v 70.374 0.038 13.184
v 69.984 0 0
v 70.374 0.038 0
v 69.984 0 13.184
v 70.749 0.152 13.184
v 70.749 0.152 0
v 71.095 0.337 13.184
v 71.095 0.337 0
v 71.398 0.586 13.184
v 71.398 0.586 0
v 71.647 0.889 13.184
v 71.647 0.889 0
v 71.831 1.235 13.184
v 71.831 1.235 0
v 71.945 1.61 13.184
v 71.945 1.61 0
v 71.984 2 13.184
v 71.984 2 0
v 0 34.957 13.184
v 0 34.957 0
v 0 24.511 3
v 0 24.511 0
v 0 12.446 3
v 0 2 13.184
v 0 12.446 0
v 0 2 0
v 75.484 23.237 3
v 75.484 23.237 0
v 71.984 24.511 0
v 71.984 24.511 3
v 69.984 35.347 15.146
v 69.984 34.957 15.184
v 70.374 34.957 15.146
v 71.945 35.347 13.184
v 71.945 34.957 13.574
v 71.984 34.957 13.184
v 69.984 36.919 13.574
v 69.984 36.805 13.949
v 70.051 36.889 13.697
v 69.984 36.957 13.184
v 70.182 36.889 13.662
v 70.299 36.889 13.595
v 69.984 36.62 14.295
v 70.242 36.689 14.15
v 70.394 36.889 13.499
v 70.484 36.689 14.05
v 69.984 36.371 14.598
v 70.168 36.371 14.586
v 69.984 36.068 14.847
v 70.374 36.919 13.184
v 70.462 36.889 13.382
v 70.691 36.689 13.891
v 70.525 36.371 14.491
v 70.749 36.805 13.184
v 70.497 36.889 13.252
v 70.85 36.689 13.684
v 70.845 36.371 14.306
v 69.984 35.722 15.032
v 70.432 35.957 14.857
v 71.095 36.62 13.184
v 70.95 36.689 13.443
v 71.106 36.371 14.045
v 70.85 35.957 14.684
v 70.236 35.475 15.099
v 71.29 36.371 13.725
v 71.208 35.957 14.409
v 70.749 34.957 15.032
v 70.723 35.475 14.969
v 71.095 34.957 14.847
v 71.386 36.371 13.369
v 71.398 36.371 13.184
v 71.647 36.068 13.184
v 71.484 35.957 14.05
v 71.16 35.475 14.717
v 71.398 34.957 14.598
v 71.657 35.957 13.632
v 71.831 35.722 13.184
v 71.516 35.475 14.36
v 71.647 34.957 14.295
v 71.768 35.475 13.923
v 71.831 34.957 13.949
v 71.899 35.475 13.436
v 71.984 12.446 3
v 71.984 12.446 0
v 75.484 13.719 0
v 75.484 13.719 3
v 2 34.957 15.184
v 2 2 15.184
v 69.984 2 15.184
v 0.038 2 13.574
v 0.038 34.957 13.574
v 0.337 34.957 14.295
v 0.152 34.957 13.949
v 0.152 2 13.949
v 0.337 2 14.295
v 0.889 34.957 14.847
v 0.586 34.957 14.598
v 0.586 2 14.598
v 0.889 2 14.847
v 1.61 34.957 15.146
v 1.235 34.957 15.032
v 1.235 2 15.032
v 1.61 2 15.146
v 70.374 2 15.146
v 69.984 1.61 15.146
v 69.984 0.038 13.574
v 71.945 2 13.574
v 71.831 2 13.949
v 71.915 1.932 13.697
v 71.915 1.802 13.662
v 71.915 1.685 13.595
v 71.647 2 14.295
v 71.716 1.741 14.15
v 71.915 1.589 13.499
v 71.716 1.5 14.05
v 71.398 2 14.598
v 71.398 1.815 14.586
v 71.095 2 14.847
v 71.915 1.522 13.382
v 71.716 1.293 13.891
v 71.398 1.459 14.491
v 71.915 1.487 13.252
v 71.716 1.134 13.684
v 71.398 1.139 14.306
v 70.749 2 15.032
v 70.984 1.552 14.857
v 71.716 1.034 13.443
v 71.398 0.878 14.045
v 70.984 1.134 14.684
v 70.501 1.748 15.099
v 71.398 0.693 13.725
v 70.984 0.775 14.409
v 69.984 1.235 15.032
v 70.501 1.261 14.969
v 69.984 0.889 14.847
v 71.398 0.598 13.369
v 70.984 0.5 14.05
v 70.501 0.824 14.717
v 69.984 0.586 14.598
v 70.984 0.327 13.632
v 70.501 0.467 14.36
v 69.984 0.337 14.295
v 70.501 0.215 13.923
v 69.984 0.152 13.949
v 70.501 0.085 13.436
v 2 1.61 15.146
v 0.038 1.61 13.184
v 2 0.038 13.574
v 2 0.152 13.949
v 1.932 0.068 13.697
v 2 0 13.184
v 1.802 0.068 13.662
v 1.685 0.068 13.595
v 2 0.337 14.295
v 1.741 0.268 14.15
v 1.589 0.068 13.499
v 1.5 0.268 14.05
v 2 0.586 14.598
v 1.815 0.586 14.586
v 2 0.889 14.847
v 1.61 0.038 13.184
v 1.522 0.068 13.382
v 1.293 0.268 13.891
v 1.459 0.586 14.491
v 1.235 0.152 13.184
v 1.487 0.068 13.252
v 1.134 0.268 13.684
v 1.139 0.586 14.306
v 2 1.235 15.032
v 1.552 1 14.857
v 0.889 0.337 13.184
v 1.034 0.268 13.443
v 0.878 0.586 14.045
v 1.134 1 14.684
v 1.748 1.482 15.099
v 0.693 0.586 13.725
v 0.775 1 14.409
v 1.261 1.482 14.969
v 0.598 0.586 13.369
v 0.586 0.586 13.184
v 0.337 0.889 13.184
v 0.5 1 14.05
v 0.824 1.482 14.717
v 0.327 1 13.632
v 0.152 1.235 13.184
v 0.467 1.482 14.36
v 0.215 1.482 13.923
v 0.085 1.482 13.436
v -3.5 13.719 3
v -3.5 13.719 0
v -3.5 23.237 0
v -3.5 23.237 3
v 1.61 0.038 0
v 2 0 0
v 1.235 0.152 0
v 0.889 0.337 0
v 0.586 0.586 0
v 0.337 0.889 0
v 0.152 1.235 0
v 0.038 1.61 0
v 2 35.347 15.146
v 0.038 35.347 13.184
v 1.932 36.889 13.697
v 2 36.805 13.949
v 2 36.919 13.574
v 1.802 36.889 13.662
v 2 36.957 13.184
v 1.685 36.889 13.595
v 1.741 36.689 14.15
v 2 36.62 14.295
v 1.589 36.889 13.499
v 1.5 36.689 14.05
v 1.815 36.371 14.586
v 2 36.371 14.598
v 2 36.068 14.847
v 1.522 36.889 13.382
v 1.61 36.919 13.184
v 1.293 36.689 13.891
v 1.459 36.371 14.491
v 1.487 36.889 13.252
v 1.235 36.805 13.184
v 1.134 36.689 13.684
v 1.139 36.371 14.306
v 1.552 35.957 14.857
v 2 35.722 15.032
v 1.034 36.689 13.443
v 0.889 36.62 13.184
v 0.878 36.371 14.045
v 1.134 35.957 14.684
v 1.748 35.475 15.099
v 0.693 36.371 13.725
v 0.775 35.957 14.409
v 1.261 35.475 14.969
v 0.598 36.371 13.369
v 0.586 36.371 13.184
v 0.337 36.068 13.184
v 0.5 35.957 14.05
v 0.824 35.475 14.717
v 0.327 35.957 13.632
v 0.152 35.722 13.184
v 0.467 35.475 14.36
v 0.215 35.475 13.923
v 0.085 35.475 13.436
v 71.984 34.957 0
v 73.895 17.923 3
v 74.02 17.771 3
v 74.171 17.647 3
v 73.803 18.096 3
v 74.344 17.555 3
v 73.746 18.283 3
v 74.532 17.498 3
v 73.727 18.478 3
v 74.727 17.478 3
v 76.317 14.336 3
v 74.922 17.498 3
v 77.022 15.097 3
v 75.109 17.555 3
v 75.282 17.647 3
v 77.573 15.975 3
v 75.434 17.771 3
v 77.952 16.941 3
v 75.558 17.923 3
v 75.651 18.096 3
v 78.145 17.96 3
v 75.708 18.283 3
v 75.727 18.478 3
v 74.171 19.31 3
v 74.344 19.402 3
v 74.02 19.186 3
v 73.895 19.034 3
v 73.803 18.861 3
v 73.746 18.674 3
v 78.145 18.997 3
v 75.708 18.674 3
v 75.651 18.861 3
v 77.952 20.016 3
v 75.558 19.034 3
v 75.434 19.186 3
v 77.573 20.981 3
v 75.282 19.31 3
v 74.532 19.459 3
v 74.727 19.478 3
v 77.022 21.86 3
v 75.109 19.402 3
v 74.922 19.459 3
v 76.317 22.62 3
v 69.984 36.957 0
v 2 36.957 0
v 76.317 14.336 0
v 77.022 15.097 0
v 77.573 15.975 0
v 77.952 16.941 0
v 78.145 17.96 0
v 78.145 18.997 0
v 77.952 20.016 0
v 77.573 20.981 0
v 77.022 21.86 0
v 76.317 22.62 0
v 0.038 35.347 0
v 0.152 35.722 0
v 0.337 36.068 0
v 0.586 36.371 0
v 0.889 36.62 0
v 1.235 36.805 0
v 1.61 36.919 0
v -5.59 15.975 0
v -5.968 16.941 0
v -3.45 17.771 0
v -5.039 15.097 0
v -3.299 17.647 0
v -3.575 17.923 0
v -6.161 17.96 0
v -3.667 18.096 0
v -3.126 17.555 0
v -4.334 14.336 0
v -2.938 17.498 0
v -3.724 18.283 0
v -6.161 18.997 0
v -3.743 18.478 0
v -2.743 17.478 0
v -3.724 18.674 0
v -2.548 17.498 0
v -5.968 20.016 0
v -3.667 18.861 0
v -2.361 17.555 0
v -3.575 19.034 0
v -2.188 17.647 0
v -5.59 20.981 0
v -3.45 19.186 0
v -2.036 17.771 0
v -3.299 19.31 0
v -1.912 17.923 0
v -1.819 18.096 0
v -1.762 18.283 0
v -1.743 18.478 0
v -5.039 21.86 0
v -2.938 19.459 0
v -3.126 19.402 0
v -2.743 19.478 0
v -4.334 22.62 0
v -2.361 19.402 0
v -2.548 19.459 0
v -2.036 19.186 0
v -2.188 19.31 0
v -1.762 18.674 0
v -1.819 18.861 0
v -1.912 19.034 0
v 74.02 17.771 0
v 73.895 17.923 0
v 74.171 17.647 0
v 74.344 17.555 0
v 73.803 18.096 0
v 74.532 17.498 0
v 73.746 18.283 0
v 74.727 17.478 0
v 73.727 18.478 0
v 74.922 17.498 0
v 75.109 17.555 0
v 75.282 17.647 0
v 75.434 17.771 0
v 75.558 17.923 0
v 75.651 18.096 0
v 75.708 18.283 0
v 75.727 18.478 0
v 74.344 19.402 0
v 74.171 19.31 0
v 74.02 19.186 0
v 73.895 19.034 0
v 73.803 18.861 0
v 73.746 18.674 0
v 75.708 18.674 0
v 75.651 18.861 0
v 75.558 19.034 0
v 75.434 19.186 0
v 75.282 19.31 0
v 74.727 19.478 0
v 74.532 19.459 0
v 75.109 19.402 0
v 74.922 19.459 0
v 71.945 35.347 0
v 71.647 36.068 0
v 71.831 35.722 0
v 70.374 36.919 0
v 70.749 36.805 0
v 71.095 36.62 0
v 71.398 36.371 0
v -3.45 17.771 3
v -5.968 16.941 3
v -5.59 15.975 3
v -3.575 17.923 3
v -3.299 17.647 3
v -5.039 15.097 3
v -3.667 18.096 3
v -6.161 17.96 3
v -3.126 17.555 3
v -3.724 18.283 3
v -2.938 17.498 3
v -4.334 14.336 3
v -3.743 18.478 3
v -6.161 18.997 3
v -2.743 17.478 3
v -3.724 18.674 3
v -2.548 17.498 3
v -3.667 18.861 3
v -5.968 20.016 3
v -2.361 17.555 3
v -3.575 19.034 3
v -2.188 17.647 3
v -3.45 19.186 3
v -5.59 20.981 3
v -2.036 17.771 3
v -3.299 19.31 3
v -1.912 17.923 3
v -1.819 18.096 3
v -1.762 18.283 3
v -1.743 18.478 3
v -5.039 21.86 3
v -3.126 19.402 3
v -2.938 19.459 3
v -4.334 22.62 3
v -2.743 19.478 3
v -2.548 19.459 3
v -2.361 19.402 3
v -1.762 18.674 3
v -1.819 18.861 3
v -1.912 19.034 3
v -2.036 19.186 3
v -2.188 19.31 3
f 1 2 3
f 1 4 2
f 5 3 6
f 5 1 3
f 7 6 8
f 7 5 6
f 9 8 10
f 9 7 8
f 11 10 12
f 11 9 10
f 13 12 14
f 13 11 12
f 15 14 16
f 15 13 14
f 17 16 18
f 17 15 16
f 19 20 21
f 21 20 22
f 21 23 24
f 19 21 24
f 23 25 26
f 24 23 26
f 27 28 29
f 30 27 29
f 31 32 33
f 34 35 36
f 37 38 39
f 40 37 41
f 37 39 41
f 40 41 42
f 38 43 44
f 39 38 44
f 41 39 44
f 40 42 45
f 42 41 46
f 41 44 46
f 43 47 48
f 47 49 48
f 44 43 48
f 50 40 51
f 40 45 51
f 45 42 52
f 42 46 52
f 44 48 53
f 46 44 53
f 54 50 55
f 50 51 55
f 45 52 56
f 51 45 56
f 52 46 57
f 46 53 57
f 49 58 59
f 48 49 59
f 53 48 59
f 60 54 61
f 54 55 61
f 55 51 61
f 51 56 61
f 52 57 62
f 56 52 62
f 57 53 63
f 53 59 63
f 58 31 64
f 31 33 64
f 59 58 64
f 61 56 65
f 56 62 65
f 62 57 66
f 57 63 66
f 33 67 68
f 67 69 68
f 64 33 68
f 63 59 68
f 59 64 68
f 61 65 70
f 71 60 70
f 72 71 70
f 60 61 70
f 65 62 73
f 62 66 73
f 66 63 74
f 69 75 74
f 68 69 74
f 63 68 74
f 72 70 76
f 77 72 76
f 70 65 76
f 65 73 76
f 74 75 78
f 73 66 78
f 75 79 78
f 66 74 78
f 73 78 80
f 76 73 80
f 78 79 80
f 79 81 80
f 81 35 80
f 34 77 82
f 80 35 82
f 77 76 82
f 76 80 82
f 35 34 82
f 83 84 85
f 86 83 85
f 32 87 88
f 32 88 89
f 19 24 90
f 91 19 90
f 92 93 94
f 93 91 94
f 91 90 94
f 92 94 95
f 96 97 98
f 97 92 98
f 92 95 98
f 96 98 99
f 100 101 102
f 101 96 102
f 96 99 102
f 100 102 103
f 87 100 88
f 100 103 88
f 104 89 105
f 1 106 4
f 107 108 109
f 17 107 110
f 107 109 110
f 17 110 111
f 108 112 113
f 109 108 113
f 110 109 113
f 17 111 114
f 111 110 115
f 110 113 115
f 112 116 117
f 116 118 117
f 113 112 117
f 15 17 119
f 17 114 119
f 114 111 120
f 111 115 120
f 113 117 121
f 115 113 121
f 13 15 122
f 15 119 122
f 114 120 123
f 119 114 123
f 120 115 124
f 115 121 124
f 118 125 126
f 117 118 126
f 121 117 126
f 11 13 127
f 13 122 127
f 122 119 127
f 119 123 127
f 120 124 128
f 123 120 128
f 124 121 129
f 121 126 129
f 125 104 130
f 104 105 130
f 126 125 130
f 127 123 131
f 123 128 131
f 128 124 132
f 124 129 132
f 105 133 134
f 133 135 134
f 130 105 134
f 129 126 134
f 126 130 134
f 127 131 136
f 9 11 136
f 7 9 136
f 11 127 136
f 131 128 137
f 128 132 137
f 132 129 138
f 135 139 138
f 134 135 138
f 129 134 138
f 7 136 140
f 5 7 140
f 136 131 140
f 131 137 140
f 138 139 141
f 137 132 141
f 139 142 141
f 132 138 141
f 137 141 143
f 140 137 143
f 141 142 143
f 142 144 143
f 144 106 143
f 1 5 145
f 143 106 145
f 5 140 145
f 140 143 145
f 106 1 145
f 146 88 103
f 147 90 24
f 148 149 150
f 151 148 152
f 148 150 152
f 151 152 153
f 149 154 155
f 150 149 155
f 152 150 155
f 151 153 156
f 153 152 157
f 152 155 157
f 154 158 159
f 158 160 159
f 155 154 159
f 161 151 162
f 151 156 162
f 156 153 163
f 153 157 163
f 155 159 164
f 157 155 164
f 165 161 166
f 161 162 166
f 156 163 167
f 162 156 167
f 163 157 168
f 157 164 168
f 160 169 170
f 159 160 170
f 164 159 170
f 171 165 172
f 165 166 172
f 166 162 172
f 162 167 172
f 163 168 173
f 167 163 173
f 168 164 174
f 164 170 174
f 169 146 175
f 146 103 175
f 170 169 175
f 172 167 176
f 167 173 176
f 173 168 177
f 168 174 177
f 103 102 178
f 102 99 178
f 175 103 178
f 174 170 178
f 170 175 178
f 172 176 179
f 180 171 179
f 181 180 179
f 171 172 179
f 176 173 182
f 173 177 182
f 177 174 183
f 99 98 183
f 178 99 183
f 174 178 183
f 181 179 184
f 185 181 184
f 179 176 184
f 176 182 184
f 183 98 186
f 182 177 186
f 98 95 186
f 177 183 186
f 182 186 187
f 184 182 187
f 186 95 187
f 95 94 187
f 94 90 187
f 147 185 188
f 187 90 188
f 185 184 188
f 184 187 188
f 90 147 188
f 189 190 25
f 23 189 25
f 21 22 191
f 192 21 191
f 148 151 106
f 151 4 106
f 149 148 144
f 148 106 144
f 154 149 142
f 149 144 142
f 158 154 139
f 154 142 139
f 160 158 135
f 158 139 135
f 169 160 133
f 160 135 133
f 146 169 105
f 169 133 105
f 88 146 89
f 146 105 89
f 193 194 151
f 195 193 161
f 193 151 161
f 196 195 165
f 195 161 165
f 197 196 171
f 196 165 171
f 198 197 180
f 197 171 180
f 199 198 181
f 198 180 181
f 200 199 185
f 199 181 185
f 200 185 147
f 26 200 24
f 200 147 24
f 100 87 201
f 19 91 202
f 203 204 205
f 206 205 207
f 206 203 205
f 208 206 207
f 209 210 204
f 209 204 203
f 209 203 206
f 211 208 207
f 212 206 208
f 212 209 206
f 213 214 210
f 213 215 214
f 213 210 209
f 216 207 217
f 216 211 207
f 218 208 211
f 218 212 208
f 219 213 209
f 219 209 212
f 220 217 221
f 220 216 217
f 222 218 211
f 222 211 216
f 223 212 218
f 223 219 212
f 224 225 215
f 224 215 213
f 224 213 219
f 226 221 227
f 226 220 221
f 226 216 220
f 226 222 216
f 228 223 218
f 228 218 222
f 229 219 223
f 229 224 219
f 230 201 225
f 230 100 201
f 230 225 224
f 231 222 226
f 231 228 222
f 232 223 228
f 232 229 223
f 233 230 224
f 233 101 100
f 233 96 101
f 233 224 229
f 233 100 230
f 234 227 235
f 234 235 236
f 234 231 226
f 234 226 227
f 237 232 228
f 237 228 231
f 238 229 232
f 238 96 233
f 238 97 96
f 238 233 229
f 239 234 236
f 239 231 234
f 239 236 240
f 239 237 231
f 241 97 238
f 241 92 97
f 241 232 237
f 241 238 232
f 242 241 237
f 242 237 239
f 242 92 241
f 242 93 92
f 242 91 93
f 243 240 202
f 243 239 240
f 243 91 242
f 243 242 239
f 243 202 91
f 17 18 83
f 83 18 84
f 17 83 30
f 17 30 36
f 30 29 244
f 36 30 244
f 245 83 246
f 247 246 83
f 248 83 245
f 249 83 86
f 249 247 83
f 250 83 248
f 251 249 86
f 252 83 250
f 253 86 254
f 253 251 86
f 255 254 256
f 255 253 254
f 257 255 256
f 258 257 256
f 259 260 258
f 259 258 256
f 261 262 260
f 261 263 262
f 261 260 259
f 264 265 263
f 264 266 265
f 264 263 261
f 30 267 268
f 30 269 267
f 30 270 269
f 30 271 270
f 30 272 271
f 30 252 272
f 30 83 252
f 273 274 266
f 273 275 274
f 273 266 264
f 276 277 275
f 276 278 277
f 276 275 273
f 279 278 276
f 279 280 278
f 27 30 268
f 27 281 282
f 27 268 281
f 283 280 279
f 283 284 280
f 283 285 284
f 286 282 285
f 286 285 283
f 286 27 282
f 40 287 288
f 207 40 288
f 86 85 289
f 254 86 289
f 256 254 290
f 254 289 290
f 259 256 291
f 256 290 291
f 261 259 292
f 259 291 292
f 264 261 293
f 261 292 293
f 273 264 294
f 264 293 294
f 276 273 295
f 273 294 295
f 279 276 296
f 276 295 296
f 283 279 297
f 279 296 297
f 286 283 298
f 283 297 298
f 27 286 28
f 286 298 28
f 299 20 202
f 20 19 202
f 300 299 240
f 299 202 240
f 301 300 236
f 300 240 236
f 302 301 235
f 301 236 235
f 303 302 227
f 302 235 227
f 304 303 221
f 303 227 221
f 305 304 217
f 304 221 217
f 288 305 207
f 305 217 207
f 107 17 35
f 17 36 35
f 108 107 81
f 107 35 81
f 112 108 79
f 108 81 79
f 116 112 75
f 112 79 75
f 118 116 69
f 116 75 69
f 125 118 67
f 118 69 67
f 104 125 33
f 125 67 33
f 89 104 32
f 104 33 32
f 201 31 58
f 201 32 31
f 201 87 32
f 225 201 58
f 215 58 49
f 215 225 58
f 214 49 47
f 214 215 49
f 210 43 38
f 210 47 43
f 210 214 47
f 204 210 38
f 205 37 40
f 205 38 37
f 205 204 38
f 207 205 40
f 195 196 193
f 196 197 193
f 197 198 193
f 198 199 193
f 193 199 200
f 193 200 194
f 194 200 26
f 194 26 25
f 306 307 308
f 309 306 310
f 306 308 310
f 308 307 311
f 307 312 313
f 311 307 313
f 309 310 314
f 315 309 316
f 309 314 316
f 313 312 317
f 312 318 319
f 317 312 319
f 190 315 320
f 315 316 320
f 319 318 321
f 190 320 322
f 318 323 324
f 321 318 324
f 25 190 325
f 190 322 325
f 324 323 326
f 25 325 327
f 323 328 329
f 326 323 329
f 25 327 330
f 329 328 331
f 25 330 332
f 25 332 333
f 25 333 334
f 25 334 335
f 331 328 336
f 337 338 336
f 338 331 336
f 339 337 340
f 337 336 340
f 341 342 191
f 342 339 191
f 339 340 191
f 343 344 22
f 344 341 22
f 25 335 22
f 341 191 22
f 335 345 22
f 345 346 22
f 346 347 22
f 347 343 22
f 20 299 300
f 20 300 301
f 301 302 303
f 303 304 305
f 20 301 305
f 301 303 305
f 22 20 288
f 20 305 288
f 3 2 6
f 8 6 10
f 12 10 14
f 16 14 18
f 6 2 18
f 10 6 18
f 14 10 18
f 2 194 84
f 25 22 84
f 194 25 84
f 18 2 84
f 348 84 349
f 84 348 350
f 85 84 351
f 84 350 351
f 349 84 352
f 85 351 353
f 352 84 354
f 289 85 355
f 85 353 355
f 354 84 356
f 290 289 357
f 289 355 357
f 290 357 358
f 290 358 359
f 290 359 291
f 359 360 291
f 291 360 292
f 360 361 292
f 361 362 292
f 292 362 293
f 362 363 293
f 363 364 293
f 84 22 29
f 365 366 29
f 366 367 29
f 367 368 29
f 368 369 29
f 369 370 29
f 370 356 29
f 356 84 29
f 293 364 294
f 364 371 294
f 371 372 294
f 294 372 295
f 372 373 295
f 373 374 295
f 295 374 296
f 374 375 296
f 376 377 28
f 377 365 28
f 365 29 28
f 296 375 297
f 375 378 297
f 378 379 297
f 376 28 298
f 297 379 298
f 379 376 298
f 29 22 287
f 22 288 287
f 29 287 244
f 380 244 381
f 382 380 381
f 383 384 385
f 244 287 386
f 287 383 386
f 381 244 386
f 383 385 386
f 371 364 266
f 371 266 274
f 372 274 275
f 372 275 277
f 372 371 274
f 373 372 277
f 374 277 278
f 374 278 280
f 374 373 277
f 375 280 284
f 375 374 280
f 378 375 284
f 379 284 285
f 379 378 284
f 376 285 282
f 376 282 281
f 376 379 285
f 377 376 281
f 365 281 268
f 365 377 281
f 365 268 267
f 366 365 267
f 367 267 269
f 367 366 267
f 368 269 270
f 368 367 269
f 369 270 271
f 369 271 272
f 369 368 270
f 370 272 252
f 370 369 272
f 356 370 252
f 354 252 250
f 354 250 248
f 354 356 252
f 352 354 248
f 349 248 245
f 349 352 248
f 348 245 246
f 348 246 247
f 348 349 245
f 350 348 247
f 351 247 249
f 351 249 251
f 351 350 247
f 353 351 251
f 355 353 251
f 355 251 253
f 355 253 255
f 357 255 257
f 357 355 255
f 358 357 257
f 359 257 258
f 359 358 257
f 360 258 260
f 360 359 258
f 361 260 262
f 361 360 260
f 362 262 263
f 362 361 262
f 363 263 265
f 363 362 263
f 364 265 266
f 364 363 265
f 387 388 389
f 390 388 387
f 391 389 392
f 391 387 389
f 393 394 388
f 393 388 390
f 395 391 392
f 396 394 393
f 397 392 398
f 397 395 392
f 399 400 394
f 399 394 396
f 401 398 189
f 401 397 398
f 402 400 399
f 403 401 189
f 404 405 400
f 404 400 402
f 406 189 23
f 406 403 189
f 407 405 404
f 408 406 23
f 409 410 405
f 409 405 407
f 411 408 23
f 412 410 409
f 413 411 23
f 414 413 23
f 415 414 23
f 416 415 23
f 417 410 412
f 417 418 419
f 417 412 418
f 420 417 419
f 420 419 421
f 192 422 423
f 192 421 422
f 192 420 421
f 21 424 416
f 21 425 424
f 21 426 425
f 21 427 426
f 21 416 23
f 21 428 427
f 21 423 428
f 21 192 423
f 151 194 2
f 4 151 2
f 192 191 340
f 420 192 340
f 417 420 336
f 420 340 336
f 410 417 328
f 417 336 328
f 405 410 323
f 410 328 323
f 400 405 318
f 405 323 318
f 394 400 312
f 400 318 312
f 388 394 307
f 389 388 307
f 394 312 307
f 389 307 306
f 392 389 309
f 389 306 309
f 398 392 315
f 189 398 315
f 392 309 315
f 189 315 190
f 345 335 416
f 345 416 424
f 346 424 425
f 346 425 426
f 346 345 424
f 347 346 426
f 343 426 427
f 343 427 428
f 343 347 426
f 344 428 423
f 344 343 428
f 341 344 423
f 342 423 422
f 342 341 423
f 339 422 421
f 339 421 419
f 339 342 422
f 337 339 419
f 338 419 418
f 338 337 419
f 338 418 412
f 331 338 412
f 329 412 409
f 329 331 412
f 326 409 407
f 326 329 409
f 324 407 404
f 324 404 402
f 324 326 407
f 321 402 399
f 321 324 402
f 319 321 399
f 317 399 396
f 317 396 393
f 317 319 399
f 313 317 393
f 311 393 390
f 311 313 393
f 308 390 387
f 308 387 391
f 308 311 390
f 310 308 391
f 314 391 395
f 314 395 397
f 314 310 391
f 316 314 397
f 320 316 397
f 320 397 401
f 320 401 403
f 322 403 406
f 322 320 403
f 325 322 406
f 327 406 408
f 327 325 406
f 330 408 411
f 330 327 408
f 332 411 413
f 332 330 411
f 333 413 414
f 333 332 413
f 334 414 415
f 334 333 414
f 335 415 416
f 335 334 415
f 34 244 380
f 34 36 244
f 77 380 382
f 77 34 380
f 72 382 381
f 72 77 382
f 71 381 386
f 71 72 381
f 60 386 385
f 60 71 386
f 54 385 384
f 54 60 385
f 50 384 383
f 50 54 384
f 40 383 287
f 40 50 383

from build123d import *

# Parameters (mm, degrees)
F1_DEPTH = 15.18412
F0_R     = 1
F2_DEPTH = 3
F3_R     = 2


with BuildPart() as f1:
    # F0 (on Top) → F1 (new body)
    with BuildSketch(Plane.XY):
        Polygon((0, 12.4455), (0, 0), (71.9836, 0), (71.9836, 12.4455), (71.9836, 24.511), (71.9836, 36.957), (0, 36.957), (0, 24.511), align=None)
    extrude(amount=F1_DEPTH)

    # F0 (on Top) → F2 (join)
    with BuildSketch(Plane.XY):
        with BuildLine():
            Line((71.9836, 24.511), (71.9836, 12.4455))
            Line((71.9836, 12.4455), (75.4836, 13.719396))
            ThreePointArc((75.4836, 13.719396), (78.1688, 18.47825), (75.4836, 23.237104))
            Line((75.4836, 23.237104), (71.9836, 24.511))
        make_face()
        with Locations((74.7268, 18.4785)):
            Circle(F0_R, mode=Mode.SUBTRACT)
        with BuildLine():
            Line((-3.5, 13.719396), (0, 12.4455))
            Line((0, 12.4455), (0, 24.511))
            Line((0, 24.511), (-3.5, 23.237104))
            ThreePointArc((-3.5, 23.237104), (-6.1852, 18.47825), (-3.5, 13.719396))
        make_face()
        with Locations((-2.7432, 18.4785)):
            Circle(F0_R, mode=Mode.SUBTRACT)
    extrude(amount=F2_DEPTH)

    # F3
    f3_edges = [f1.edges().sort_by_distance(p)[0] for p in [
        (0, 18.4785, 15.18412),
        (35.9918, 0, 15.18412),
        (71.9836, 18.4785, 15.18412),
        (35.9918, 36.957, 15.18412),
        (0, 36.957, 7.59206),
        (71.9836, 36.957, 7.59206),
        (71.9836, 0, 7.59206),
        (0, 0, 7.59206),
    ]]
    fillet(f3_edges, radius=F3_R)


solid = f1.part
